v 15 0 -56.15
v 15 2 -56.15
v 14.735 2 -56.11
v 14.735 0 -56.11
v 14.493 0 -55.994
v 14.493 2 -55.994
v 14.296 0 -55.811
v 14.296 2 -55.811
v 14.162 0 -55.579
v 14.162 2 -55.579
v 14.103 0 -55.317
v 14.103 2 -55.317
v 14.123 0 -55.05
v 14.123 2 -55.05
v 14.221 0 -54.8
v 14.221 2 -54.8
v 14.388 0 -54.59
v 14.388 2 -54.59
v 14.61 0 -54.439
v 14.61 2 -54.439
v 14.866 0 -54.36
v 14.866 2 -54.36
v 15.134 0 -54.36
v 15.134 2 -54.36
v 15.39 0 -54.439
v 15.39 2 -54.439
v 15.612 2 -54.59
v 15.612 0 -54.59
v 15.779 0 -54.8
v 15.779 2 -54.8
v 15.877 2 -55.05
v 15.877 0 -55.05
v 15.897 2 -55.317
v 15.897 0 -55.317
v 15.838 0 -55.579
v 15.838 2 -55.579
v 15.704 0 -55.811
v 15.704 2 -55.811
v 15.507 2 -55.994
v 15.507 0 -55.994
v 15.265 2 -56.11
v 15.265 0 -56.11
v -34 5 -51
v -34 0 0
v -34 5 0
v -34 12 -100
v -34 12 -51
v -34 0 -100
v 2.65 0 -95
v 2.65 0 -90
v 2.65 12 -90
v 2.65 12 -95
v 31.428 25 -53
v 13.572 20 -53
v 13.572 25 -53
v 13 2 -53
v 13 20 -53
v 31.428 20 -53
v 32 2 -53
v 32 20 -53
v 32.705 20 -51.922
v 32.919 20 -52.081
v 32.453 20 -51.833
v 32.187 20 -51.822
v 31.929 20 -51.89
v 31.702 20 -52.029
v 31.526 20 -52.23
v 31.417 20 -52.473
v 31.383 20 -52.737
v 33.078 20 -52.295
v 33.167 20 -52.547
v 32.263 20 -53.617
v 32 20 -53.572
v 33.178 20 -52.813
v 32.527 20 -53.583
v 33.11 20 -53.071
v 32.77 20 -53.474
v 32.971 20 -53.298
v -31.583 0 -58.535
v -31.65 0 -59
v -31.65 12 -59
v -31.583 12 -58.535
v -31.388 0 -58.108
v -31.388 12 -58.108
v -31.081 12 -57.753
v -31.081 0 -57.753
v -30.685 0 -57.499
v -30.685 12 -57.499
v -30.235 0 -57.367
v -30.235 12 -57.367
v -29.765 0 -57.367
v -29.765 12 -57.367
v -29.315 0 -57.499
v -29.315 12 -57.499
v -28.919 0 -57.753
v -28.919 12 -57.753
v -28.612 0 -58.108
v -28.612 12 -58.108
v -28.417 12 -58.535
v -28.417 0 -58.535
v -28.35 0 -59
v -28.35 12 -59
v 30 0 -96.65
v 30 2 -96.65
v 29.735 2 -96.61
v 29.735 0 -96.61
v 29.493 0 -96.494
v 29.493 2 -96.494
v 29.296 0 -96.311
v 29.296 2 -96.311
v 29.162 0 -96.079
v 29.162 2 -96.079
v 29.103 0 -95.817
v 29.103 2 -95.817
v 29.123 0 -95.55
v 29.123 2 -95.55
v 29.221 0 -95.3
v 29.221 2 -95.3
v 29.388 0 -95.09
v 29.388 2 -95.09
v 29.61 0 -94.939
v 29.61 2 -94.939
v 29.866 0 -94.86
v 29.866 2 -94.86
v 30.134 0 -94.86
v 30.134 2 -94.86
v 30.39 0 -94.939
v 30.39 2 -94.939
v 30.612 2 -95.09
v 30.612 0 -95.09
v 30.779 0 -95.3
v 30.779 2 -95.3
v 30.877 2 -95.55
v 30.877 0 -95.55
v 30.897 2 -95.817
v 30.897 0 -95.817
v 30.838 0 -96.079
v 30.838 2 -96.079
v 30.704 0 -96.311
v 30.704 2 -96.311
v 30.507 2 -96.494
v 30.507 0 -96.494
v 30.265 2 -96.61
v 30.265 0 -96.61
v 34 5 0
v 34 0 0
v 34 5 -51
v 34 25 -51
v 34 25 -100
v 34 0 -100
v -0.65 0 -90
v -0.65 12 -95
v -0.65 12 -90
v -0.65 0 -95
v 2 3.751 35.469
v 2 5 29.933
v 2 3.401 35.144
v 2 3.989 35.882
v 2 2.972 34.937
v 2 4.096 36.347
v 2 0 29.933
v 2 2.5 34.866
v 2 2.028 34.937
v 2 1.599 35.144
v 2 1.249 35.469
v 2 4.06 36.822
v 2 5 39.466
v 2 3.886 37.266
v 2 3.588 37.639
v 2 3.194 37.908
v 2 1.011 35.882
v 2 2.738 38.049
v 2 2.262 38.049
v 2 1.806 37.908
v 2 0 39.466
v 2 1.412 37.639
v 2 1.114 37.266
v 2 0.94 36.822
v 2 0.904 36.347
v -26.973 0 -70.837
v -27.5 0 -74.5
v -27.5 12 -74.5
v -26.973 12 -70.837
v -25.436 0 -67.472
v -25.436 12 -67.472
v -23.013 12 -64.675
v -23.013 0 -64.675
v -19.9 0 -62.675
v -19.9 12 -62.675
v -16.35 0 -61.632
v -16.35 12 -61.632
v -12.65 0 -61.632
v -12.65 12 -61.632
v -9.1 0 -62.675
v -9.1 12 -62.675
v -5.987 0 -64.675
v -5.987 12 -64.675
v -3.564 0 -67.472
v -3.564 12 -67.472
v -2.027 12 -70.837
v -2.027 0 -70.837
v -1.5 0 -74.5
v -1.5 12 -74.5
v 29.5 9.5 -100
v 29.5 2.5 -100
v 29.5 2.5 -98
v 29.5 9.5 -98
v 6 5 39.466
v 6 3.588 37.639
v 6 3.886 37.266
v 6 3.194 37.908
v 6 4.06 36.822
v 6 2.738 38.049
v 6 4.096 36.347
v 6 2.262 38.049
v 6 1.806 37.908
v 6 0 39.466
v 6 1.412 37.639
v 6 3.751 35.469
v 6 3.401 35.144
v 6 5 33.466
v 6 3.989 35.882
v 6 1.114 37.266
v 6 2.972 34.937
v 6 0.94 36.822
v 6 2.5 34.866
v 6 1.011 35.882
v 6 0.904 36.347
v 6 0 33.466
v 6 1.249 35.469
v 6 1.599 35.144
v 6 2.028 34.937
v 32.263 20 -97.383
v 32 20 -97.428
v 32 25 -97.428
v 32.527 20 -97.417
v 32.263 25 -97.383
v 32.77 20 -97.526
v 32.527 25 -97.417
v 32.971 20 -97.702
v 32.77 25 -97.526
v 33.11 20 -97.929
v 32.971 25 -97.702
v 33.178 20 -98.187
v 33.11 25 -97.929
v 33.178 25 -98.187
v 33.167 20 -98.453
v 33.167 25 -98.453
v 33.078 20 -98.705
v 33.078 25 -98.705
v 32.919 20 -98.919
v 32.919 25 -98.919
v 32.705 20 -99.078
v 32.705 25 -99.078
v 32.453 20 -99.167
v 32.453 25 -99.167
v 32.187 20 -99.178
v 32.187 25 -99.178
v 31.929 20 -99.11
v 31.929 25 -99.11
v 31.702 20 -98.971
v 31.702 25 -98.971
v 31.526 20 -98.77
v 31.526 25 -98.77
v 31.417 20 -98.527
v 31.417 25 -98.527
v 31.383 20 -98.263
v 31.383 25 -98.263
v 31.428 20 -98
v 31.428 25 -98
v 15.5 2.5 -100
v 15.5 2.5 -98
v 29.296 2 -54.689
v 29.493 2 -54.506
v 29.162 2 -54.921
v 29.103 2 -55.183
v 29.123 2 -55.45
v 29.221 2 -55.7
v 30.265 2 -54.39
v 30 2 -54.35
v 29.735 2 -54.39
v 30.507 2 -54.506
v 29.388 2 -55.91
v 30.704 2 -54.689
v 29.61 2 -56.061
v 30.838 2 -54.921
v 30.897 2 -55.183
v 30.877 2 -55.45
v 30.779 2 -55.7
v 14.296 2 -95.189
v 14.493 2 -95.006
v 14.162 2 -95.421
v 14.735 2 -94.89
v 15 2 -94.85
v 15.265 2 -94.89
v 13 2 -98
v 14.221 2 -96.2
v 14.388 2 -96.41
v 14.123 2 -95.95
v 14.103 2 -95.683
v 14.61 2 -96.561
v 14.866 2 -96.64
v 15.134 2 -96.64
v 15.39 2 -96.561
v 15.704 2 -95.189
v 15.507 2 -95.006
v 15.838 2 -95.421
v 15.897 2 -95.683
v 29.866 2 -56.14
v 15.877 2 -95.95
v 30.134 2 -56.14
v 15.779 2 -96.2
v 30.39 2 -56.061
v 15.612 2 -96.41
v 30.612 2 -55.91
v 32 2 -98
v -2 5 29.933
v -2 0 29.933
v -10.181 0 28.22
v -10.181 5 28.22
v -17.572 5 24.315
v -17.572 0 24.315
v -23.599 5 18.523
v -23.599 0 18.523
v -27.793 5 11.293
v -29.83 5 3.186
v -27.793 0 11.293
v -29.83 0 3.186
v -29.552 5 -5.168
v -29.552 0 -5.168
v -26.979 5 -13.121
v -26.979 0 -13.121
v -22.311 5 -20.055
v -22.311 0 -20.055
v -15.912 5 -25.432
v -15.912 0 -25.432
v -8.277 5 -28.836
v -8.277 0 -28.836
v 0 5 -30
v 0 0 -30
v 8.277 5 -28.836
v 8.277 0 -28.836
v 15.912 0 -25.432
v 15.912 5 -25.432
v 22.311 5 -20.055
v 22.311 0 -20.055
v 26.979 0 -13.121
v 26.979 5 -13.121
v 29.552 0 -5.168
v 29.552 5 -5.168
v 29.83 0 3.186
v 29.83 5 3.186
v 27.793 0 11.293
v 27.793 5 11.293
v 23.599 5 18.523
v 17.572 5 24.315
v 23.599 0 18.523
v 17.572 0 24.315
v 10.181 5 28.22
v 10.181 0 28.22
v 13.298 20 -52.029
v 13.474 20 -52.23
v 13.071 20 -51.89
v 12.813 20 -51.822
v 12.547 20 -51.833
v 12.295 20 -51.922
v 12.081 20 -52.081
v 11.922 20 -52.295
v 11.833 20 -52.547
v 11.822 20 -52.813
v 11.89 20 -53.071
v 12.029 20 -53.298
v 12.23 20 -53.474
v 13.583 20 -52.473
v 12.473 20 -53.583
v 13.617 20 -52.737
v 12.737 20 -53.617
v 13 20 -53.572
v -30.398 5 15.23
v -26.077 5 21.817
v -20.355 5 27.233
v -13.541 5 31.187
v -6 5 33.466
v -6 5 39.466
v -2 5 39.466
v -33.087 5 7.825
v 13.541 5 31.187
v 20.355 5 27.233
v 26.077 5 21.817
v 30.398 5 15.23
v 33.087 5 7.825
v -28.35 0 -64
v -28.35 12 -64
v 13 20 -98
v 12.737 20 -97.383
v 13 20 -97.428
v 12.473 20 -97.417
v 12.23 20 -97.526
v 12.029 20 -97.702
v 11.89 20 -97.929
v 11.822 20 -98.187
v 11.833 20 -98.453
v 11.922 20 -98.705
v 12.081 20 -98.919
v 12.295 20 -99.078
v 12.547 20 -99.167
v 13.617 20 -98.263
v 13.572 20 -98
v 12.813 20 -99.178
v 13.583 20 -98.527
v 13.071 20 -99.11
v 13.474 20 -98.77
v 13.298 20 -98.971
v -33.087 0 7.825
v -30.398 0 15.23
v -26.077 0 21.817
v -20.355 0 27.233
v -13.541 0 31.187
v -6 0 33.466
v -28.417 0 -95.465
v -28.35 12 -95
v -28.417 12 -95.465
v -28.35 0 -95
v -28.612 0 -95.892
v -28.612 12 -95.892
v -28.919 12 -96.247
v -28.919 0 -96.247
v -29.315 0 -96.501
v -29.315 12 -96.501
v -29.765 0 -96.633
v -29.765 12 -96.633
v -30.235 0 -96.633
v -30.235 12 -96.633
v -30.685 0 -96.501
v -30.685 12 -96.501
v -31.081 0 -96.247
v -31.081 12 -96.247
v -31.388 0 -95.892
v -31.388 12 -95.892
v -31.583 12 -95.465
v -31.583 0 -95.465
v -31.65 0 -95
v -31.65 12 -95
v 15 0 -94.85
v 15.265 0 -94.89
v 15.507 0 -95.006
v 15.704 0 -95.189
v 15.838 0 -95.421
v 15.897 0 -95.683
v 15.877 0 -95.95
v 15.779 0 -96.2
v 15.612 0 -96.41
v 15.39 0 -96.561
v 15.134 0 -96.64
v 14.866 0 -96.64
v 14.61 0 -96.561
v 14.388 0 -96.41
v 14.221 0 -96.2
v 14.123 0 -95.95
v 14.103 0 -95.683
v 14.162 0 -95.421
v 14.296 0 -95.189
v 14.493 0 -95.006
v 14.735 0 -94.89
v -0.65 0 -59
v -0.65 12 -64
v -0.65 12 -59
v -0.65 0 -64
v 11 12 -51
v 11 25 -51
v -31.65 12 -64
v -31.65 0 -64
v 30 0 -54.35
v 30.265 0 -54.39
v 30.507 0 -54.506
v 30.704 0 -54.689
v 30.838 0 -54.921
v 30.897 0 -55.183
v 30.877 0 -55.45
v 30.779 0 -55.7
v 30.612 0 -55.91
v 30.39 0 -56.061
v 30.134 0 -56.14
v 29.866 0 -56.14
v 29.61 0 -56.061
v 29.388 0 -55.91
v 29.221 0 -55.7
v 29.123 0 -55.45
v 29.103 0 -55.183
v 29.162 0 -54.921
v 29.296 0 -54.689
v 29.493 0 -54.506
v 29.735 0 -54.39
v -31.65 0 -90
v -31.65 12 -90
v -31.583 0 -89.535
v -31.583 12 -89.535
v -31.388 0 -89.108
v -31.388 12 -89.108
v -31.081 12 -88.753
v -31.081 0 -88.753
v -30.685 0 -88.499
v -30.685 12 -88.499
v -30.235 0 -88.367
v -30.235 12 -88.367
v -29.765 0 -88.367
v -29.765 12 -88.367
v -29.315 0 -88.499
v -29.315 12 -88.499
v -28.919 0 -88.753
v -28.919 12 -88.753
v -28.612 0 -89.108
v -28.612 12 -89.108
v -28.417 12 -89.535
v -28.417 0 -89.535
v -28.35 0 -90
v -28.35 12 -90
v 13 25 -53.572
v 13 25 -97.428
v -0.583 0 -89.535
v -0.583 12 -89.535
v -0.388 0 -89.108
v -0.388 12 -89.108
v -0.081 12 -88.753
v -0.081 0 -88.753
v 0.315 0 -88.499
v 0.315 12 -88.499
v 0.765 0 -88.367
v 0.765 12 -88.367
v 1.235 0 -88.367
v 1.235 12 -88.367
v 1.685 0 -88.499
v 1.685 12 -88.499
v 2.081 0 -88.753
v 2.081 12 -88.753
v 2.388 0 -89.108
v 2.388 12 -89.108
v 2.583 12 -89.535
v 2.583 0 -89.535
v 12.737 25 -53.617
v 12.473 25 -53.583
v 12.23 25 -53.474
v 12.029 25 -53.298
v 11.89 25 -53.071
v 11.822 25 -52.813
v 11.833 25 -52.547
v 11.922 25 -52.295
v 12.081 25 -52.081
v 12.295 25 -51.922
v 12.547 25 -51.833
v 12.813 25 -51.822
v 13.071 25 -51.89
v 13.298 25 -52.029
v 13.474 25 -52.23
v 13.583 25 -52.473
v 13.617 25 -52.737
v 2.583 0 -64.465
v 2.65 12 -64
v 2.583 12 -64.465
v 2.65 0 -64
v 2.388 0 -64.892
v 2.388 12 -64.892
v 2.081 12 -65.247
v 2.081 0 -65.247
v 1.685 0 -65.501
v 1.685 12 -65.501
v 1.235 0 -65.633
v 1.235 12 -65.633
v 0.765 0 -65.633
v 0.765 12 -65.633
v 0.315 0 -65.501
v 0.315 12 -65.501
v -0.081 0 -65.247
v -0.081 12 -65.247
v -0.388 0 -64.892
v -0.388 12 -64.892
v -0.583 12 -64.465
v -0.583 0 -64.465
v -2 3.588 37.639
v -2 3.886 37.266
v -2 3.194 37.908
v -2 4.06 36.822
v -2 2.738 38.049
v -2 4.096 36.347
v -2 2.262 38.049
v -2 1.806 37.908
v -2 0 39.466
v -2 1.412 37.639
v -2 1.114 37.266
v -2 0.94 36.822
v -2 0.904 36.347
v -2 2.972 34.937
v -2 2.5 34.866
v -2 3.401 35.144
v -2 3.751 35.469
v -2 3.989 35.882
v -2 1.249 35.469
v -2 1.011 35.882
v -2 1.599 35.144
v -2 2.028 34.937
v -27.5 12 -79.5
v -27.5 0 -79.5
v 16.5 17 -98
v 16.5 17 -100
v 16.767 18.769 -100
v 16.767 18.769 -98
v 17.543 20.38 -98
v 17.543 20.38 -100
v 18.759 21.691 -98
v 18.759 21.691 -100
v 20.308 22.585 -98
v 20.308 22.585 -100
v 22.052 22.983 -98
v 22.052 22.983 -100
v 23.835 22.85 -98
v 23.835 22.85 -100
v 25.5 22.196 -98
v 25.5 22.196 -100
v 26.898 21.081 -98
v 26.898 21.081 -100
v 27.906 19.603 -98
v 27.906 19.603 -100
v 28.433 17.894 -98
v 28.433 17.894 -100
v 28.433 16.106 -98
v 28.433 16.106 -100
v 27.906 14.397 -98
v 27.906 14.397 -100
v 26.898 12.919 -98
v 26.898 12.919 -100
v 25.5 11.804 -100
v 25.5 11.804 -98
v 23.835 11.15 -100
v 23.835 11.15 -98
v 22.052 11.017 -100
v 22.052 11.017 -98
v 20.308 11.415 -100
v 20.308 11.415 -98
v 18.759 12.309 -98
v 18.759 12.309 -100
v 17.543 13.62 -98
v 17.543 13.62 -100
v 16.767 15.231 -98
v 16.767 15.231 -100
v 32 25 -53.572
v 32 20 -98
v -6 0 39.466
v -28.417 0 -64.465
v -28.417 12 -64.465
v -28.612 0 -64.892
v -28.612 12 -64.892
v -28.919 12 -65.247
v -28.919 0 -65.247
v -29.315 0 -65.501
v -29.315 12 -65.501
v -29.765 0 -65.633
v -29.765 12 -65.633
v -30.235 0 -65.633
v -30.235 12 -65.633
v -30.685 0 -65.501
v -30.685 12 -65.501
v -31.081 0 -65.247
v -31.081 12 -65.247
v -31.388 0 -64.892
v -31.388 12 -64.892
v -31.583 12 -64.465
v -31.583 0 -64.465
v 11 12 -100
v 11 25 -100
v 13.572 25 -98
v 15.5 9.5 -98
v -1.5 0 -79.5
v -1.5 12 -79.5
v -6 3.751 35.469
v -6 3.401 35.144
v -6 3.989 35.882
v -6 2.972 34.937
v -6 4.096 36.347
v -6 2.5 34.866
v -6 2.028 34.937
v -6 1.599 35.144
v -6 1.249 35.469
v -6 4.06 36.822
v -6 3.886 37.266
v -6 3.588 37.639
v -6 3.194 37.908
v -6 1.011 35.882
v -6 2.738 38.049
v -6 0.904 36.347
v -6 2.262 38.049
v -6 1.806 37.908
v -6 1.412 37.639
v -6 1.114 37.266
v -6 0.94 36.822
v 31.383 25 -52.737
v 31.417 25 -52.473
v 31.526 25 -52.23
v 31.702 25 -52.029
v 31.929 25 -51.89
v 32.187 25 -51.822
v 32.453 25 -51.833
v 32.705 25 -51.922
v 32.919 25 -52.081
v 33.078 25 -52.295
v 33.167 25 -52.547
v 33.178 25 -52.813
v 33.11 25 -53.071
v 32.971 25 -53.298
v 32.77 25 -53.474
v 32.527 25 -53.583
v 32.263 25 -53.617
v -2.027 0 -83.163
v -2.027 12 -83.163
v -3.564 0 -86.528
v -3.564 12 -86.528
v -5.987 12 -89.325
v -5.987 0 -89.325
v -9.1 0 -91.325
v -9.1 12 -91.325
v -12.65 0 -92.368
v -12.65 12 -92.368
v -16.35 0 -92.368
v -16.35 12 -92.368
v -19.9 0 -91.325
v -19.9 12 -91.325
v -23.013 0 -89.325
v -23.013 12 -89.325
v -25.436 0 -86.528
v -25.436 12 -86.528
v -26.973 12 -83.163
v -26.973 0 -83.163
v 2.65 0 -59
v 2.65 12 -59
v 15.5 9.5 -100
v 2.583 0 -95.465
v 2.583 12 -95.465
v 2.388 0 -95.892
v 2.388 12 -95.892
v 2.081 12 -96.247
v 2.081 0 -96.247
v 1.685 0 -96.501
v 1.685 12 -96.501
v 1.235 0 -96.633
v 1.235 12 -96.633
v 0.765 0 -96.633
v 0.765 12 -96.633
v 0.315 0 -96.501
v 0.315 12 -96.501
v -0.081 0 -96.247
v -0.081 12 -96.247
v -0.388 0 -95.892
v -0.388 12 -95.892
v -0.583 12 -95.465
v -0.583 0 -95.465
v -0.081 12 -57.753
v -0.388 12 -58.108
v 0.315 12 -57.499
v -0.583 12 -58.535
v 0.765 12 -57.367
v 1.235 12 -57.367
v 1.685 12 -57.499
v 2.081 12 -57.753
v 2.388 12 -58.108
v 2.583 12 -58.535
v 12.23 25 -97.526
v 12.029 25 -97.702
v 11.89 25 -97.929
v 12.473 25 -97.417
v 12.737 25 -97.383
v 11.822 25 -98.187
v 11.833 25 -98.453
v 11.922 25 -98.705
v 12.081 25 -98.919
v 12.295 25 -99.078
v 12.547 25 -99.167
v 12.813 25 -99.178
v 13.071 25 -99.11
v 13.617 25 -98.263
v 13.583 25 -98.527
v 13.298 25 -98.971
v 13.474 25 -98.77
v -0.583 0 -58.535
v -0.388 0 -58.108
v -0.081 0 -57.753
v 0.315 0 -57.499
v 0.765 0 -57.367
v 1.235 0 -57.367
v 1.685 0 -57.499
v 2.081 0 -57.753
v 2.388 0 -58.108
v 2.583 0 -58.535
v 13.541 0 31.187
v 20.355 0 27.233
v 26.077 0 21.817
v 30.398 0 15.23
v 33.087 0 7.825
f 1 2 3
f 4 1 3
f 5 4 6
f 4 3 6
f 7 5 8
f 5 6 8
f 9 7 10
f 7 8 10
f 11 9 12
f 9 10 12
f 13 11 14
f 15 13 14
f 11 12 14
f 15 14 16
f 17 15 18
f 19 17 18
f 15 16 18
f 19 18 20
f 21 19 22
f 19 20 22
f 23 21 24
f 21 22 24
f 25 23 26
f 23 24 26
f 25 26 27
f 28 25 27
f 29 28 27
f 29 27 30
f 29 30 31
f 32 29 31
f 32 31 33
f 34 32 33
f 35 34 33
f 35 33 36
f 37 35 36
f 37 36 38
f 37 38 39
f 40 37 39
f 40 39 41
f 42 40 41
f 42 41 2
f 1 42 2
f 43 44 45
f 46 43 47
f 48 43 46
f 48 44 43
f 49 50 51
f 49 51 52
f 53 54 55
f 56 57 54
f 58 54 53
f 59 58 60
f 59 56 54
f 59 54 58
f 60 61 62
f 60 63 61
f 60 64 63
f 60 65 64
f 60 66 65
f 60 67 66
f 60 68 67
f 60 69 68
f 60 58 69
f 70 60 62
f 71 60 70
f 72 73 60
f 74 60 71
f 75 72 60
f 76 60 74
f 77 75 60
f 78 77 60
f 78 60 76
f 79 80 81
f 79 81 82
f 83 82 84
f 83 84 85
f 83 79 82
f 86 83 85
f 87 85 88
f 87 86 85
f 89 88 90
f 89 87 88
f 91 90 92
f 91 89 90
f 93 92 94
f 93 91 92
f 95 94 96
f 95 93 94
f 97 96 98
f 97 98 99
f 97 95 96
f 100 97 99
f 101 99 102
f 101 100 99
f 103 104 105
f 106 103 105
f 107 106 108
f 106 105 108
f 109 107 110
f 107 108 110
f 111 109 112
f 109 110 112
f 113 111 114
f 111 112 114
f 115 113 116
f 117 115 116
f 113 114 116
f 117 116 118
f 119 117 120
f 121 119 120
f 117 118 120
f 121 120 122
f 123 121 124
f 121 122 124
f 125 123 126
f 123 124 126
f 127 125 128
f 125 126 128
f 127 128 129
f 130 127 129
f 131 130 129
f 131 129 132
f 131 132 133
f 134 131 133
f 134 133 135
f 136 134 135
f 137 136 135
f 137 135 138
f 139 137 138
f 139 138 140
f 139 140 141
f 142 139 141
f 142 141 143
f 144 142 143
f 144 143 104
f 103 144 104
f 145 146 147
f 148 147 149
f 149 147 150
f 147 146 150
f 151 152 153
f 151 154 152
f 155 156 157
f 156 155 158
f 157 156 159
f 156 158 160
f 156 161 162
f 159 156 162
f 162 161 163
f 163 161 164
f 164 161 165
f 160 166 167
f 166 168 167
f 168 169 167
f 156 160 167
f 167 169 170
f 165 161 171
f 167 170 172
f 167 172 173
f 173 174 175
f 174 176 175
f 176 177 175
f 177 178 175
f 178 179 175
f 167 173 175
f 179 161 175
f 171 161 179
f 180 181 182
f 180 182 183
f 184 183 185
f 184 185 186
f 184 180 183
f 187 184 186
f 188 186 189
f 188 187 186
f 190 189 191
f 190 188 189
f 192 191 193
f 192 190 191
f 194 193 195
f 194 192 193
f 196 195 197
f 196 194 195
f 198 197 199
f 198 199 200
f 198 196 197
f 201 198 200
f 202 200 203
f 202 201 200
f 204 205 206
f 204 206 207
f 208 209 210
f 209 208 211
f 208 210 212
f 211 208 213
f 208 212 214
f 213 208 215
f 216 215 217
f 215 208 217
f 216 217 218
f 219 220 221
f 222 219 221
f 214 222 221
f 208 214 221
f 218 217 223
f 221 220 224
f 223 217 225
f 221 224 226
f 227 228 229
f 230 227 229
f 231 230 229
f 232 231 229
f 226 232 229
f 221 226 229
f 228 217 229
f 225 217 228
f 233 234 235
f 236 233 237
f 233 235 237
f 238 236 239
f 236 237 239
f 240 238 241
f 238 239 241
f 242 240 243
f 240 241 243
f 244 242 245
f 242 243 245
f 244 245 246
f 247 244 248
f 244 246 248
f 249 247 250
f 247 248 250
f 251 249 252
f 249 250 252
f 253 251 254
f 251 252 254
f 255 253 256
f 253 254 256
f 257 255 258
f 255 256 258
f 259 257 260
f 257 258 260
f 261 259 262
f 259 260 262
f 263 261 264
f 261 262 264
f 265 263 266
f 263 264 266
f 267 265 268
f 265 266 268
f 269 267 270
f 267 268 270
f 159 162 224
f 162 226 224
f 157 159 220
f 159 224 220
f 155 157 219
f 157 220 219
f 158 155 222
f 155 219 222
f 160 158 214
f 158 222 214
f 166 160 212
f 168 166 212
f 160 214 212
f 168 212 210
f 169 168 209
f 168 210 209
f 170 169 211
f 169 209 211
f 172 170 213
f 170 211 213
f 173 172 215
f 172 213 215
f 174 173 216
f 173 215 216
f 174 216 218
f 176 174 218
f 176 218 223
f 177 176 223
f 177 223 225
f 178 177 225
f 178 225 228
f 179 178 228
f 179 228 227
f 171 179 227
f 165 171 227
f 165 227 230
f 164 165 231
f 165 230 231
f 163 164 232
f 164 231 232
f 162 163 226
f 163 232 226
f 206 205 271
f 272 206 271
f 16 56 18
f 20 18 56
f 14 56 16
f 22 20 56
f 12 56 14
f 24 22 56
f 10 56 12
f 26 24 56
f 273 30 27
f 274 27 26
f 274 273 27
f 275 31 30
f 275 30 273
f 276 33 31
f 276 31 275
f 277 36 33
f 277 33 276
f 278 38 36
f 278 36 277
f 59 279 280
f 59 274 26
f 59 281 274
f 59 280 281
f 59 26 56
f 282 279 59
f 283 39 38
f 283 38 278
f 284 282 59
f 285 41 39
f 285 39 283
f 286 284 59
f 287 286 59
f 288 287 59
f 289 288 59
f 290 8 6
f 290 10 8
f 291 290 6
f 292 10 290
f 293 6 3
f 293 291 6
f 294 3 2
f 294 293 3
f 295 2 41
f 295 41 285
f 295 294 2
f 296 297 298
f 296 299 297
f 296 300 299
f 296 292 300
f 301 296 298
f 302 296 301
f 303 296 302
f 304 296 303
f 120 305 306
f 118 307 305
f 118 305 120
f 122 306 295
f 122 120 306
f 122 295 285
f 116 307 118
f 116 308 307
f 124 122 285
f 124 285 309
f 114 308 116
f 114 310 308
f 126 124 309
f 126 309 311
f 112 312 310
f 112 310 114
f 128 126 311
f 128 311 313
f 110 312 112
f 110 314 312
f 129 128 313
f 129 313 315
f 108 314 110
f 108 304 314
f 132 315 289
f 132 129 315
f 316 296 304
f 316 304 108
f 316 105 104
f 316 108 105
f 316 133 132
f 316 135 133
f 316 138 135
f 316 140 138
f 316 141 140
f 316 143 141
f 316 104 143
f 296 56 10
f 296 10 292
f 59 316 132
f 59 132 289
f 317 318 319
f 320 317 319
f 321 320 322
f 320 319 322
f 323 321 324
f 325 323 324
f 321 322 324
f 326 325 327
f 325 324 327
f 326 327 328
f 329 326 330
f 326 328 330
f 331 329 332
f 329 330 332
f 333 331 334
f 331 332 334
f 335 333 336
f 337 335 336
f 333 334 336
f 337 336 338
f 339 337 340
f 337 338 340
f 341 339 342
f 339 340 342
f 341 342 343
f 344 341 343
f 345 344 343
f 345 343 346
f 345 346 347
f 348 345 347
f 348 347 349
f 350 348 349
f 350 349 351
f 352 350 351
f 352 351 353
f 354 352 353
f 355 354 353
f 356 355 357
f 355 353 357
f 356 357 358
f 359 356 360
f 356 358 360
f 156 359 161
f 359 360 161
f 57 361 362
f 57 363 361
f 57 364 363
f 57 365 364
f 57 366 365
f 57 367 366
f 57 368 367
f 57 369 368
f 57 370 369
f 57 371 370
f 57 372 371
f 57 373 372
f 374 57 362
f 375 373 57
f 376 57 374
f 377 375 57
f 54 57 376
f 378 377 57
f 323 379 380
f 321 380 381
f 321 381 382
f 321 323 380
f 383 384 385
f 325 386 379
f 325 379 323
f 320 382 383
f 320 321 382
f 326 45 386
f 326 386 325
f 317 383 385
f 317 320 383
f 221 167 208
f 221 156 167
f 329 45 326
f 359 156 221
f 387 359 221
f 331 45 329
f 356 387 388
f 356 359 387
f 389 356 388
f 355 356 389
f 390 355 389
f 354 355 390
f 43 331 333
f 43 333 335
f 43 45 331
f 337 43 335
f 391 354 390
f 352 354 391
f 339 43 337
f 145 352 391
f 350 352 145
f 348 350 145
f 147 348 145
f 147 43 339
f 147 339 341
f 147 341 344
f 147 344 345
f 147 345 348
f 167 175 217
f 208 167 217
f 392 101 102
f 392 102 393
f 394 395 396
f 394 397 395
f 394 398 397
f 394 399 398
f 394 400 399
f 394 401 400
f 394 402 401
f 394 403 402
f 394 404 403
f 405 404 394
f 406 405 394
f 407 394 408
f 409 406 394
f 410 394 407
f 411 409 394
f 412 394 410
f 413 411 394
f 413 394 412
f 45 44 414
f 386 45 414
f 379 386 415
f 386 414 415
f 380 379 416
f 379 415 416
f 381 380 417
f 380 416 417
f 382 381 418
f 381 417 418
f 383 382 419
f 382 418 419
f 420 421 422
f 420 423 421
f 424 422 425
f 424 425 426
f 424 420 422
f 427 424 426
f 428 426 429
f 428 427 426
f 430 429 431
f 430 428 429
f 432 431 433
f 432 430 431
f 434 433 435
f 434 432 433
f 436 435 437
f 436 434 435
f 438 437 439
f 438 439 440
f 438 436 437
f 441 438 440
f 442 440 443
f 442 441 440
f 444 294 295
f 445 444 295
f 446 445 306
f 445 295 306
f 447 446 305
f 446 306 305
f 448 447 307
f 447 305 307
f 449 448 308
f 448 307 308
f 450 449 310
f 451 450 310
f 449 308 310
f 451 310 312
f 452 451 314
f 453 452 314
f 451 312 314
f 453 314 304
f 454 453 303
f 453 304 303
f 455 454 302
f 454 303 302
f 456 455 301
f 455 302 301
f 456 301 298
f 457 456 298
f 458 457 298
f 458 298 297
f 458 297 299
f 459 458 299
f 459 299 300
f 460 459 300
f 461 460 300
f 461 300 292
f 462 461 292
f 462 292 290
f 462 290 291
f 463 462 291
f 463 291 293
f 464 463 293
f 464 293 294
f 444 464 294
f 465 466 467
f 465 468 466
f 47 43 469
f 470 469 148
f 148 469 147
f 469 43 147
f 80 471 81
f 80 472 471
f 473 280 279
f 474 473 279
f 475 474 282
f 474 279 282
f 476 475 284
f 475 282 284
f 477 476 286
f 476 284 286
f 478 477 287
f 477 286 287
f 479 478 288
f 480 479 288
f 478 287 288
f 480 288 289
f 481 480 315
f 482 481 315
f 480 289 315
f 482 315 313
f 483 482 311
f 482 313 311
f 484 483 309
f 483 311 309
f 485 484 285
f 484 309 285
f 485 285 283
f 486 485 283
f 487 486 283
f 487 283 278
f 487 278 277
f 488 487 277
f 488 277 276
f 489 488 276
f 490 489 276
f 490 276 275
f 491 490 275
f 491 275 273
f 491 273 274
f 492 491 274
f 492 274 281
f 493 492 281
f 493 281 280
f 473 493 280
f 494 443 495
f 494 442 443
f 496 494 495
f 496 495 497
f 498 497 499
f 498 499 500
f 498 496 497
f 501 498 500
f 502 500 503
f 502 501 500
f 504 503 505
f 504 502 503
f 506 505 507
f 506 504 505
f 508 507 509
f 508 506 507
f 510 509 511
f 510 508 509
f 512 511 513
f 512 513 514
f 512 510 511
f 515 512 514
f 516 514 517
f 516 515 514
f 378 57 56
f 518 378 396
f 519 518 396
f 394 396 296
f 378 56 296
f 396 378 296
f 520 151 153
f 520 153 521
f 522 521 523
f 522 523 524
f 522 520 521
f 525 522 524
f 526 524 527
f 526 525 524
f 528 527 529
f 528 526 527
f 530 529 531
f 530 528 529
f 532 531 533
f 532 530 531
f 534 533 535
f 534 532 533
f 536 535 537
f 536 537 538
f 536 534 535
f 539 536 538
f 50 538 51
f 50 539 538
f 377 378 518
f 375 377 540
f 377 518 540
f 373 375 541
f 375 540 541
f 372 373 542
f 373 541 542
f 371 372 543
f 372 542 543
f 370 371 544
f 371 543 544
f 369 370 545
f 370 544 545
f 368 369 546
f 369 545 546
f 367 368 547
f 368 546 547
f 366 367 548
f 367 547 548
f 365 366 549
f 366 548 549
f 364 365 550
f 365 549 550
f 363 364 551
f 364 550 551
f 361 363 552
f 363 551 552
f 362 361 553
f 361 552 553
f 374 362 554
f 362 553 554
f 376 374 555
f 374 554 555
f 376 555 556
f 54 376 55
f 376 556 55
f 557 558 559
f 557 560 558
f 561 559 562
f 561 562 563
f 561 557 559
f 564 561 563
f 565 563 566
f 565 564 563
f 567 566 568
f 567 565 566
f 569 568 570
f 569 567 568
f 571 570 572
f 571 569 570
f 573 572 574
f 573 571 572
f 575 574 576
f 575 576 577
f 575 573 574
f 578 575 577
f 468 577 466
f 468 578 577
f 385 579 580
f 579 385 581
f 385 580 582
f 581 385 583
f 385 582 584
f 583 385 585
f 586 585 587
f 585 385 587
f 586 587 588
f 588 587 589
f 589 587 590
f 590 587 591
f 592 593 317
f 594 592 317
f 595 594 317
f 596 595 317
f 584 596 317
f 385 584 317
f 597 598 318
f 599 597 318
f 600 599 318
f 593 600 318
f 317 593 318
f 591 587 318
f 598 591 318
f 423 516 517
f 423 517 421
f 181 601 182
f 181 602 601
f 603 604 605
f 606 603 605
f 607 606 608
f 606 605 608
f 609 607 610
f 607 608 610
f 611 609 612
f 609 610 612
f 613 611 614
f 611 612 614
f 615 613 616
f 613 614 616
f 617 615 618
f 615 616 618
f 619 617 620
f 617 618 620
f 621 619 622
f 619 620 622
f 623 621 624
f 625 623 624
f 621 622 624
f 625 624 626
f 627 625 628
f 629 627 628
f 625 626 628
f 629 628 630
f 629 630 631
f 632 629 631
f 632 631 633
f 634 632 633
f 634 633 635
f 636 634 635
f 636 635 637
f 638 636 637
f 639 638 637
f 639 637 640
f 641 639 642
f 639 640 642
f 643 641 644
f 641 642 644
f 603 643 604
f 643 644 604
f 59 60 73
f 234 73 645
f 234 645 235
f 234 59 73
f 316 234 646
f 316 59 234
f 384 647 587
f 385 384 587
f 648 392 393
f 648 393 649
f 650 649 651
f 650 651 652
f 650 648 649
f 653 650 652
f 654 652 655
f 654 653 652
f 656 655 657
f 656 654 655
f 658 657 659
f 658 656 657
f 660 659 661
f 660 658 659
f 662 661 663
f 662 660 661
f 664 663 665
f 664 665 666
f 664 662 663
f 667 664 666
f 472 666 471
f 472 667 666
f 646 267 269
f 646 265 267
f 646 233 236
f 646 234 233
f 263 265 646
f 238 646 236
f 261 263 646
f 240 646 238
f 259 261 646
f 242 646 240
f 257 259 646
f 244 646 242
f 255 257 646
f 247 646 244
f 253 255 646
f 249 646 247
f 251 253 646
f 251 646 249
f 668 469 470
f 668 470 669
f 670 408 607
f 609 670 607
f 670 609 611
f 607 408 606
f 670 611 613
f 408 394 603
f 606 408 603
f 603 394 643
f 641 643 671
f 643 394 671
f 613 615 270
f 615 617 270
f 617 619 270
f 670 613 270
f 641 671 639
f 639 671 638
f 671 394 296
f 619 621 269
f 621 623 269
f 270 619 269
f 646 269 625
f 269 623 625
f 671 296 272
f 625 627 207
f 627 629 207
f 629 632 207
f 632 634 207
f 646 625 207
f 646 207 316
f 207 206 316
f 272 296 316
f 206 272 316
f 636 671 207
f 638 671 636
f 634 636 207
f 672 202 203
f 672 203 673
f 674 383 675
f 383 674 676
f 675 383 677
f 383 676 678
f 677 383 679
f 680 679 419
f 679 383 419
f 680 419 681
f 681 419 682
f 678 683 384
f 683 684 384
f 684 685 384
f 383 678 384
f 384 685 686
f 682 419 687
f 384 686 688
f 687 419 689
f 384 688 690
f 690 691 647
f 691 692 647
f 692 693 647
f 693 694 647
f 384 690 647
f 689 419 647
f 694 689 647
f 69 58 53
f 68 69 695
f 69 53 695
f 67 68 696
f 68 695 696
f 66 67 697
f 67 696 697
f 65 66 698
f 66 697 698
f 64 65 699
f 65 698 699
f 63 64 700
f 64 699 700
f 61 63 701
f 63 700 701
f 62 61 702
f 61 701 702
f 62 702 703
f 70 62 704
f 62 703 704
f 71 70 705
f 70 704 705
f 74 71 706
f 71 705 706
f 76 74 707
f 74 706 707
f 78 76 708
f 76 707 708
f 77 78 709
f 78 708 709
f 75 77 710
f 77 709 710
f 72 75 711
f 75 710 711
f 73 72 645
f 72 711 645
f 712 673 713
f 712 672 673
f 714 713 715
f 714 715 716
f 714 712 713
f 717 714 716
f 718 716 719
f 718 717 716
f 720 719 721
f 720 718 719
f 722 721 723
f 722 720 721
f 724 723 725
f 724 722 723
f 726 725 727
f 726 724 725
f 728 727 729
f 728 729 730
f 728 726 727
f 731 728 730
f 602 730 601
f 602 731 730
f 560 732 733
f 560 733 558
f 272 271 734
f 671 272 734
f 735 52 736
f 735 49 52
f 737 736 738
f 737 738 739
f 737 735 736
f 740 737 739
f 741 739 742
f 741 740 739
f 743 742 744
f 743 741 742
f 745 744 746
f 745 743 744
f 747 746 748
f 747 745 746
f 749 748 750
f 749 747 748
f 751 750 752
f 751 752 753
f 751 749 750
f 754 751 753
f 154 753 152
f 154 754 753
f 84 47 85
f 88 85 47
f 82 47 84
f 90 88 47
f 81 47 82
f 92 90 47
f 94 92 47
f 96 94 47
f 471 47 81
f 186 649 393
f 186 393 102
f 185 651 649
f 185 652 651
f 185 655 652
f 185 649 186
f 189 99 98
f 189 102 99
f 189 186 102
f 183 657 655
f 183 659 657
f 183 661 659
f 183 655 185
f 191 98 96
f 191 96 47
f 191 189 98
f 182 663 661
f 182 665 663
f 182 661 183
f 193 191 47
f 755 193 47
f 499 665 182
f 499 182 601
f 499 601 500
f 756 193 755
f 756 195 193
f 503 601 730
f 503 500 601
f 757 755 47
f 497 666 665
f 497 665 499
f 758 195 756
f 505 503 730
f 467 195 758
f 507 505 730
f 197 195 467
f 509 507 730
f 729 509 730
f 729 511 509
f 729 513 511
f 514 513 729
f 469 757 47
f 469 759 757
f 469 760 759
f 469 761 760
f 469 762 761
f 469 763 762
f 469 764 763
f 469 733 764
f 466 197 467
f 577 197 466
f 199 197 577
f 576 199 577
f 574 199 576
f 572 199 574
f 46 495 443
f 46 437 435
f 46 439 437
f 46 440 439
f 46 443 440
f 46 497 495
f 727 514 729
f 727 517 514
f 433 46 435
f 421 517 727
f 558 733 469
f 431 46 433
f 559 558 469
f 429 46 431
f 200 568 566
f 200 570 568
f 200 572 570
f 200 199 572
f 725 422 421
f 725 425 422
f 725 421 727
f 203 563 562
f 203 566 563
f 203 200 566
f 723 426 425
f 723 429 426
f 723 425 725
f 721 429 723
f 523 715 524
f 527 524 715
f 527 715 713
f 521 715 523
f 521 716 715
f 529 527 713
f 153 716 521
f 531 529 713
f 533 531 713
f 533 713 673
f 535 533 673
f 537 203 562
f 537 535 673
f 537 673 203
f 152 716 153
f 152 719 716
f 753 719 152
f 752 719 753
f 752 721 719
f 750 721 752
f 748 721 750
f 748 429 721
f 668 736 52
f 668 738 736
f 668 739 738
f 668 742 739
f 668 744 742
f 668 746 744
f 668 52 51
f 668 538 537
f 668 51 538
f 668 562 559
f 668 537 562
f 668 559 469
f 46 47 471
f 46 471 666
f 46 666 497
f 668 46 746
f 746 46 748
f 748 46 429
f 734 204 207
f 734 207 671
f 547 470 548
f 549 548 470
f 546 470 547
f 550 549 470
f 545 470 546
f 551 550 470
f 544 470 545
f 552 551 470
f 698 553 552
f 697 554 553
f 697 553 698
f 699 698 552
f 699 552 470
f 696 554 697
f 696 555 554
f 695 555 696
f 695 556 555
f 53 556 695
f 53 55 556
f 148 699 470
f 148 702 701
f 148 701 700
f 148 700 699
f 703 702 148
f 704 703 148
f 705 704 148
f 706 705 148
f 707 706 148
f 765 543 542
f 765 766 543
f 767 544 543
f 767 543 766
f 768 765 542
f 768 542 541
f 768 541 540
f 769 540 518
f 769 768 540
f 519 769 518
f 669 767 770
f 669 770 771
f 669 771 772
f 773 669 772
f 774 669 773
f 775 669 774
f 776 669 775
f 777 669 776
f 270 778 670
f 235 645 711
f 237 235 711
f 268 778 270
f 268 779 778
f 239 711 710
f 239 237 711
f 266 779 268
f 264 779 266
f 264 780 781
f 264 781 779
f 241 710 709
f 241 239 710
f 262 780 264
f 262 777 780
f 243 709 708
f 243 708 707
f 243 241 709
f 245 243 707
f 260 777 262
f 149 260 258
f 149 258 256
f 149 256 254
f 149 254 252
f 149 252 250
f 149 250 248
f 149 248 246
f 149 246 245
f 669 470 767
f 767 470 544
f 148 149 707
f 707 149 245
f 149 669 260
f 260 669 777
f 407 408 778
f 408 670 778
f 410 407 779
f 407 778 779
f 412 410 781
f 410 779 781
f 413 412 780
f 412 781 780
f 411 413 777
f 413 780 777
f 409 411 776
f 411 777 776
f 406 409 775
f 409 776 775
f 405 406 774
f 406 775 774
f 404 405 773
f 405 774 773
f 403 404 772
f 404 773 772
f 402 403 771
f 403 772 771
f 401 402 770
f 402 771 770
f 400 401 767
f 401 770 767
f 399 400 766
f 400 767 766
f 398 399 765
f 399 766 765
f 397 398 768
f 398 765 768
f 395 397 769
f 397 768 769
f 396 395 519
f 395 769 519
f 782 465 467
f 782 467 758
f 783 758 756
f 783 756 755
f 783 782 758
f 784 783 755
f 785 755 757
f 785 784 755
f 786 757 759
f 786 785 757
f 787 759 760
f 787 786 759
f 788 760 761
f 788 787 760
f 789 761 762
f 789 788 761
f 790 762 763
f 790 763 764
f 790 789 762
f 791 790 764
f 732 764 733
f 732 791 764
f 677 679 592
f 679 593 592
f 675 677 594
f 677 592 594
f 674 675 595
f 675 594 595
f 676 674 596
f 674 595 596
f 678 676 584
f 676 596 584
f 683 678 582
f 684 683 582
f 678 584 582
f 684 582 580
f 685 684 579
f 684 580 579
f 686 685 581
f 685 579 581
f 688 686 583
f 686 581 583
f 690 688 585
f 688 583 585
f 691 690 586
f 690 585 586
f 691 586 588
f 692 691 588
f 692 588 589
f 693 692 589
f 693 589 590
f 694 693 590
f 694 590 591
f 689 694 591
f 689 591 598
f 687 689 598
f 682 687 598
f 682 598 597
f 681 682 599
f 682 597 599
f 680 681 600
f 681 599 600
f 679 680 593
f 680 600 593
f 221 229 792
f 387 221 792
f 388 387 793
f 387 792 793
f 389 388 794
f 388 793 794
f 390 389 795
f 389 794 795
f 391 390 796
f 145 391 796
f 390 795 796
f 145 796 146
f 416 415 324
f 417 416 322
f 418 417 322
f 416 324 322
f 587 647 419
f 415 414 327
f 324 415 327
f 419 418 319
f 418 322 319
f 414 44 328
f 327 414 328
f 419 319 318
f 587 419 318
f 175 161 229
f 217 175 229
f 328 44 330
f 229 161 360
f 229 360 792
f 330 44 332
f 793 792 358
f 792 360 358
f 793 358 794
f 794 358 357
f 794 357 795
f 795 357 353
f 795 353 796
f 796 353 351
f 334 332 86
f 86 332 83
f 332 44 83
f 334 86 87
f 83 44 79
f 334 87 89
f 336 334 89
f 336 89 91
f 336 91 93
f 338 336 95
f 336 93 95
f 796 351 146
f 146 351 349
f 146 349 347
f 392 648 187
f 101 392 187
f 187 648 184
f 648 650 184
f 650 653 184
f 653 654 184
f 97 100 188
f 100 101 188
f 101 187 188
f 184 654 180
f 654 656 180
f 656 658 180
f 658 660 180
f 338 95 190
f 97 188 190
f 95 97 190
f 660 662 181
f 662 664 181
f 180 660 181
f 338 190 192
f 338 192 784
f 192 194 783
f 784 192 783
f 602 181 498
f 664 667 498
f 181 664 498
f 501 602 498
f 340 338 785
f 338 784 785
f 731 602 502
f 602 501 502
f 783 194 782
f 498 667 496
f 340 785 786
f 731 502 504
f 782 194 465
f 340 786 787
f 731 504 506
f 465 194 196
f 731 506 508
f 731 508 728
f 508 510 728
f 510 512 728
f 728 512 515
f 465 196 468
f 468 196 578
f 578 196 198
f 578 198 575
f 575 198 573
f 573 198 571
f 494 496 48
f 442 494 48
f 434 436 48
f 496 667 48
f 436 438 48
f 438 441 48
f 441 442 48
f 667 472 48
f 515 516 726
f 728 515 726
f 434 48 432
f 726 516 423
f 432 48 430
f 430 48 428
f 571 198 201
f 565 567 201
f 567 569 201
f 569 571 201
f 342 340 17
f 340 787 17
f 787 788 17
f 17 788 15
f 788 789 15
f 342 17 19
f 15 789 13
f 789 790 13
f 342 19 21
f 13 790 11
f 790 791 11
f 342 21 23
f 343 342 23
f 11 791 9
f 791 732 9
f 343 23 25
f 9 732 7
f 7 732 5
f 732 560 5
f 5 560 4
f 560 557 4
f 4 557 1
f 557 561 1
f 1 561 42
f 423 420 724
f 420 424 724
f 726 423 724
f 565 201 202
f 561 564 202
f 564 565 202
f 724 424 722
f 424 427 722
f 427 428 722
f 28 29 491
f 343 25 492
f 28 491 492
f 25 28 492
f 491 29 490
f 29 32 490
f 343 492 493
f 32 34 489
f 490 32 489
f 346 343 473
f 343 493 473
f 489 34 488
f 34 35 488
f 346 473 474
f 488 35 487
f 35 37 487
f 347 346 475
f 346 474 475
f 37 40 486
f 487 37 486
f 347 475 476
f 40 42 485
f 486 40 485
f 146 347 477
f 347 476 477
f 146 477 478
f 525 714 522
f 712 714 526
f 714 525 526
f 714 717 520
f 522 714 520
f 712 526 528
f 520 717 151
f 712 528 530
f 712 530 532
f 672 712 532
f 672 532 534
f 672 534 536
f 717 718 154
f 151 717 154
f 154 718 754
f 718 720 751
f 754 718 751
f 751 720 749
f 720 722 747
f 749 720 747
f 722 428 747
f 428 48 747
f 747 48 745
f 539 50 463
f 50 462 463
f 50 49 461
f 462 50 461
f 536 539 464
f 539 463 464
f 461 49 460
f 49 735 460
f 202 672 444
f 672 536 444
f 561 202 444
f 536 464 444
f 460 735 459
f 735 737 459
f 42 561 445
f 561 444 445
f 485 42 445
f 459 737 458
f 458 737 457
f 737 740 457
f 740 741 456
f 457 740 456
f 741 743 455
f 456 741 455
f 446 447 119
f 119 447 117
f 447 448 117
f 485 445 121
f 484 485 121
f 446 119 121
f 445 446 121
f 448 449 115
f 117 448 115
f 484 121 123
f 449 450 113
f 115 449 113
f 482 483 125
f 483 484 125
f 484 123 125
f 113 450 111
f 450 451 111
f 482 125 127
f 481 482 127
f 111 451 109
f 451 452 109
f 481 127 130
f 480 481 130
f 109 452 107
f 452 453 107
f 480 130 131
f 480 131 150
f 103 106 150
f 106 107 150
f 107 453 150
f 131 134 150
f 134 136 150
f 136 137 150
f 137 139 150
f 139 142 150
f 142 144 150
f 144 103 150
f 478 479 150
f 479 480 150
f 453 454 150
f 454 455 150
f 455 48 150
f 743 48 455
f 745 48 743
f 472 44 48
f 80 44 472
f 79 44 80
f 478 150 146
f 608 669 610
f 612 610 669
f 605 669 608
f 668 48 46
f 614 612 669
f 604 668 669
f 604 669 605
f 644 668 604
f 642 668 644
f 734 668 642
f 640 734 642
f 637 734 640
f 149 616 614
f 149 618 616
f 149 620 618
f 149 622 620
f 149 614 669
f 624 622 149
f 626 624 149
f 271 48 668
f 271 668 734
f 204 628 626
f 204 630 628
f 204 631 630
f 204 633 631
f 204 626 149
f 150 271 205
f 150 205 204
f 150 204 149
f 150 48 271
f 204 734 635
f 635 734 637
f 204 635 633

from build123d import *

# Parameters (mm, degrees)
EXTRUDE_1_DEPTH     = 5
SKETCH_4_R          = 1.6
CUT_EXTRUDE_1_DEPTH = 10
SKETCH_5_W          = 23
SKETCH_5_H          = 49
EXTRUDE_2_DEPTH     = 25
SHELL_1_T           = -2
SKETCH_6_R          = 6
SKETCH_6_W          = 14
SKETCH_6_H          = 7
CUT_EXTRUDE_2_DEPTH = 2
SKETCH_7_R          = 0.9
CUT_EXTRUDE_3_DEPTH = 5
SKETCH_10_R         = 0.9
CUT_EXTRUDE_4_DEPTH = 10
SKETCH_11_W         = 45
SKETCH_11_H         = 49
EXTRUDE_3_DEPTH     = 7


with BuildPart() as part:
    # 草图2 → 凸台-拉伸1 (new body)
    with BuildSketch(Plane(origin=(0, 0, 0), x_dir=(1, 0, 0), z_dir=(0, 1, 0))):
        with BuildLine():
            Line((6, -39.466401061), (6, -33.466401061))
            ThreePointArc((6, -33.466401061), (26.076809621, -21.817424229), (34, 0))
            Line((34, 0), (34, 51))
            Line((34, 51), (11, 51))
            Line((11, 51), (11, 100))
            Line((11, 100), (-34, 100))
            Line((-34, 100), (-34, 0))
            ThreePointArc((-34, 0), (-26.076809621, -21.817424229), (-6, -33.466401061))
            Line((-6, -33.466401061), (-6, -39.466401061))
            Line((-6, -39.466401061), (-2, -39.466401061))
            Line((-2, -39.466401061), (-2, -29.933259094))
            ThreePointArc((-2, -29.933259094), (0, 30), (2, -29.933259094))
            Line((2, -29.933259094), (2, -39.466401061))
            Line((2, -39.466401061), (6, -39.466401061))
        make_face()
        with BuildLine():
            ThreePointArc((-0.65, 90), (1, 88.35), (2.65, 90))
            Line((2.65, 90), (2.65, 95))
            ThreePointArc((2.65, 95), (1, 96.65), (-0.65, 95))
            Line((-0.65, 95), (-0.65, 90))
        make_face(mode=Mode.SUBTRACT)
        with BuildLine():
            ThreePointArc((-31.65, 90), (-30, 88.35), (-28.35, 90))
            Line((-28.35, 90), (-28.35, 95))
            ThreePointArc((-28.35, 95), (-30, 96.65), (-31.65, 95))
            Line((-31.65, 95), (-31.65, 90))
        make_face(mode=Mode.SUBTRACT)
        with BuildLine():
            ThreePointArc((-27.5, 74.5), (-14.5, 61.5), (-1.5, 74.5))
            Line((-1.5, 74.5), (-1.5, 79.5))
            ThreePointArc((-1.5, 79.5), (-14.5, 92.5), (-27.5, 79.5))
            Line((-27.5, 79.5), (-27.5, 74.5))
        make_face(mode=Mode.SUBTRACT)
        with BuildLine():
            ThreePointArc((-0.65, 59), (1, 57.35), (2.65, 59))
            Line((2.65, 59), (2.65, 64))
            ThreePointArc((2.65, 64), (1, 65.65), (-0.65, 64))
            Line((-0.65, 64), (-0.65, 59))
        make_face(mode=Mode.SUBTRACT)
        with BuildLine():
            ThreePointArc((-31.65, 59), (-30, 57.35), (-28.35, 59))
            Line((-28.35, 59), (-28.35, 64))
            ThreePointArc((-28.35, 64), (-30, 65.65), (-31.65, 64))
            Line((-31.65, 64), (-31.65, 59))
        make_face(mode=Mode.SUBTRACT)
    extrude(amount=EXTRUDE_1_DEPTH)

    # 草图4 → 切除-拉伸1 (cut, symmetric)
    with BuildSketch(Plane(origin=(0, 0, 0), x_dir=(0, 0, -1), z_dir=(1, 0, 0))):
        with Locations((-36.466401061, 2.5)):
            Circle(SKETCH_4_R)
    extrude(amount=CUT_EXTRUDE_1_DEPTH, both=True, mode=Mode.SUBTRACT)



with BuildPart() as body_2:
    # 草图5 → 凸台-拉伸2 (new body)
    with BuildSketch(Plane(origin=(0, 0, 0), x_dir=(1, 0, 0), z_dir=(0, 1, 0))):
        with Locations((22.5, 75.5)):
            Rectangle(SKETCH_5_W, SKETCH_5_H)
    extrude(amount=EXTRUDE_2_DEPTH)

    # 抽壳1
    shell_1_openings = [body_2.faces().sort_by_distance(p)[0] for p in [
        (22.5, 25, -75.5),
    ]]
    offset(amount=SHELL_1_T, openings=shell_1_openings, kind=Kind.INTERSECTION)

    # 草图6 → 切除-拉伸2 (cut)
    with BuildSketch(Plane(origin=(0, 0, -100), x_dir=(-1, 0, 0), z_dir=(0, 0, -1))):
        with Locations((-22.5, 17)):
            Circle(SKETCH_6_R)
        with Locations((-22.5, 6)):
            Rectangle(SKETCH_6_W, SKETCH_6_H)
    extrude(amount=-CUT_EXTRUDE_2_DEPTH, mode=Mode.SUBTRACT)

    # 草图7 → 切除-拉伸3 (cut)
    with BuildSketch(Plane(origin=(0, 25, 0), x_dir=(1, 0, 0), z_dir=(0, 1, 0))):
        with Locations((12.717157288, 52.717157288)):
            Circle(SKETCH_7_R)
        with Locations((32.282842712, 52.717157288)):
            Circle(SKETCH_7_R)
        with Locations((32.282842712, 98.282842712)):
            Circle(SKETCH_7_R)
        with Locations((12.717157288, 98.282842712)):
            Circle(SKETCH_7_R)
    extrude(amount=-CUT_EXTRUDE_3_DEPTH, mode=Mode.SUBTRACT)

    # 草图10 → 切除-拉伸4 (cut)
    with BuildSketch(Plane(origin=(0, 2, 0), x_dir=(1, 0, 0), z_dir=(0, 1, 0))):
        with Locations(Location((15, 95.75, 0), (0, 0, 270))):
            Circle(SKETCH_10_R)
        with Locations(Location((30, 95.75, 0), (0, 0, 90))):
            Circle(SKETCH_10_R)
        with Locations(Location((30, 55.25, 0), (0, 0, 270))):
            Circle(SKETCH_10_R)
        with Locations(Location((15, 55.25, 0), (0, 0, 90))):
            Circle(SKETCH_10_R)
    extrude(amount=-CUT_EXTRUDE_4_DEPTH, mode=Mode.SUBTRACT)


with BuildPart() as part_1:
    add(part.part)

    add(body_2.part)  # 凸台-拉伸3 merges body 2
    # 草图11 → 凸台-拉伸3 (add)
    with BuildSketch(Plane(origin=(0, 5, 0), x_dir=(1, 0, 0), z_dir=(0, 1, 0))):
        with Locations((-11.5, 75.5)):
            Rectangle(SKETCH_11_W, SKETCH_11_H)
        with BuildLine():
            Line((-0.65, 95), (-0.65, 90))
            ThreePointArc((-0.65, 90), (1, 88.35), (2.65, 90))
            Line((2.65, 90), (2.65, 95))
            ThreePointArc((2.65, 95), (1, 96.65), (-0.65, 95))
        make_face(mode=Mode.SUBTRACT)
        with BuildLine():
            Line((-31.65, 95), (-31.65, 90))
            ThreePointArc((-31.65, 90), (-30, 88.35), (-28.35, 90))
            Line((-28.35, 90), (-28.35, 95))
            ThreePointArc((-28.35, 95), (-30, 96.65), (-31.65, 95))
        make_face(mode=Mode.SUBTRACT)
        with BuildLine():
            Line((-27.5, 79.5), (-27.5, 74.5))
            ThreePointArc((-27.5, 74.5), (-14.5, 61.5), (-1.5, 74.5))
            Line((-1.5, 74.5), (-1.5, 79.5))
            ThreePointArc((-1.5, 79.5), (-14.5, 92.5), (-27.5, 79.5))
        make_face(mode=Mode.SUBTRACT)
        with BuildLine():
            Line((-0.65, 64), (-0.65, 59))
            ThreePointArc((-0.65, 59), (1, 57.35), (2.65, 59))
            Line((2.65, 59), (2.65, 64))
            ThreePointArc((2.65, 64), (1, 65.65), (-0.65, 64))
        make_face(mode=Mode.SUBTRACT)
        with BuildLine():
            Line((-31.65, 64), (-31.65, 59))
            ThreePointArc((-31.65, 59), (-30, 57.35), (-28.35, 59))
            Line((-28.35, 59), (-28.35, 64))
            ThreePointArc((-28.35, 64), (-30, 65.65), (-31.65, 64))
        make_face(mode=Mode.SUBTRACT)
    extrude(amount=EXTRUDE_3_DEPTH)


solid = part_1.part
